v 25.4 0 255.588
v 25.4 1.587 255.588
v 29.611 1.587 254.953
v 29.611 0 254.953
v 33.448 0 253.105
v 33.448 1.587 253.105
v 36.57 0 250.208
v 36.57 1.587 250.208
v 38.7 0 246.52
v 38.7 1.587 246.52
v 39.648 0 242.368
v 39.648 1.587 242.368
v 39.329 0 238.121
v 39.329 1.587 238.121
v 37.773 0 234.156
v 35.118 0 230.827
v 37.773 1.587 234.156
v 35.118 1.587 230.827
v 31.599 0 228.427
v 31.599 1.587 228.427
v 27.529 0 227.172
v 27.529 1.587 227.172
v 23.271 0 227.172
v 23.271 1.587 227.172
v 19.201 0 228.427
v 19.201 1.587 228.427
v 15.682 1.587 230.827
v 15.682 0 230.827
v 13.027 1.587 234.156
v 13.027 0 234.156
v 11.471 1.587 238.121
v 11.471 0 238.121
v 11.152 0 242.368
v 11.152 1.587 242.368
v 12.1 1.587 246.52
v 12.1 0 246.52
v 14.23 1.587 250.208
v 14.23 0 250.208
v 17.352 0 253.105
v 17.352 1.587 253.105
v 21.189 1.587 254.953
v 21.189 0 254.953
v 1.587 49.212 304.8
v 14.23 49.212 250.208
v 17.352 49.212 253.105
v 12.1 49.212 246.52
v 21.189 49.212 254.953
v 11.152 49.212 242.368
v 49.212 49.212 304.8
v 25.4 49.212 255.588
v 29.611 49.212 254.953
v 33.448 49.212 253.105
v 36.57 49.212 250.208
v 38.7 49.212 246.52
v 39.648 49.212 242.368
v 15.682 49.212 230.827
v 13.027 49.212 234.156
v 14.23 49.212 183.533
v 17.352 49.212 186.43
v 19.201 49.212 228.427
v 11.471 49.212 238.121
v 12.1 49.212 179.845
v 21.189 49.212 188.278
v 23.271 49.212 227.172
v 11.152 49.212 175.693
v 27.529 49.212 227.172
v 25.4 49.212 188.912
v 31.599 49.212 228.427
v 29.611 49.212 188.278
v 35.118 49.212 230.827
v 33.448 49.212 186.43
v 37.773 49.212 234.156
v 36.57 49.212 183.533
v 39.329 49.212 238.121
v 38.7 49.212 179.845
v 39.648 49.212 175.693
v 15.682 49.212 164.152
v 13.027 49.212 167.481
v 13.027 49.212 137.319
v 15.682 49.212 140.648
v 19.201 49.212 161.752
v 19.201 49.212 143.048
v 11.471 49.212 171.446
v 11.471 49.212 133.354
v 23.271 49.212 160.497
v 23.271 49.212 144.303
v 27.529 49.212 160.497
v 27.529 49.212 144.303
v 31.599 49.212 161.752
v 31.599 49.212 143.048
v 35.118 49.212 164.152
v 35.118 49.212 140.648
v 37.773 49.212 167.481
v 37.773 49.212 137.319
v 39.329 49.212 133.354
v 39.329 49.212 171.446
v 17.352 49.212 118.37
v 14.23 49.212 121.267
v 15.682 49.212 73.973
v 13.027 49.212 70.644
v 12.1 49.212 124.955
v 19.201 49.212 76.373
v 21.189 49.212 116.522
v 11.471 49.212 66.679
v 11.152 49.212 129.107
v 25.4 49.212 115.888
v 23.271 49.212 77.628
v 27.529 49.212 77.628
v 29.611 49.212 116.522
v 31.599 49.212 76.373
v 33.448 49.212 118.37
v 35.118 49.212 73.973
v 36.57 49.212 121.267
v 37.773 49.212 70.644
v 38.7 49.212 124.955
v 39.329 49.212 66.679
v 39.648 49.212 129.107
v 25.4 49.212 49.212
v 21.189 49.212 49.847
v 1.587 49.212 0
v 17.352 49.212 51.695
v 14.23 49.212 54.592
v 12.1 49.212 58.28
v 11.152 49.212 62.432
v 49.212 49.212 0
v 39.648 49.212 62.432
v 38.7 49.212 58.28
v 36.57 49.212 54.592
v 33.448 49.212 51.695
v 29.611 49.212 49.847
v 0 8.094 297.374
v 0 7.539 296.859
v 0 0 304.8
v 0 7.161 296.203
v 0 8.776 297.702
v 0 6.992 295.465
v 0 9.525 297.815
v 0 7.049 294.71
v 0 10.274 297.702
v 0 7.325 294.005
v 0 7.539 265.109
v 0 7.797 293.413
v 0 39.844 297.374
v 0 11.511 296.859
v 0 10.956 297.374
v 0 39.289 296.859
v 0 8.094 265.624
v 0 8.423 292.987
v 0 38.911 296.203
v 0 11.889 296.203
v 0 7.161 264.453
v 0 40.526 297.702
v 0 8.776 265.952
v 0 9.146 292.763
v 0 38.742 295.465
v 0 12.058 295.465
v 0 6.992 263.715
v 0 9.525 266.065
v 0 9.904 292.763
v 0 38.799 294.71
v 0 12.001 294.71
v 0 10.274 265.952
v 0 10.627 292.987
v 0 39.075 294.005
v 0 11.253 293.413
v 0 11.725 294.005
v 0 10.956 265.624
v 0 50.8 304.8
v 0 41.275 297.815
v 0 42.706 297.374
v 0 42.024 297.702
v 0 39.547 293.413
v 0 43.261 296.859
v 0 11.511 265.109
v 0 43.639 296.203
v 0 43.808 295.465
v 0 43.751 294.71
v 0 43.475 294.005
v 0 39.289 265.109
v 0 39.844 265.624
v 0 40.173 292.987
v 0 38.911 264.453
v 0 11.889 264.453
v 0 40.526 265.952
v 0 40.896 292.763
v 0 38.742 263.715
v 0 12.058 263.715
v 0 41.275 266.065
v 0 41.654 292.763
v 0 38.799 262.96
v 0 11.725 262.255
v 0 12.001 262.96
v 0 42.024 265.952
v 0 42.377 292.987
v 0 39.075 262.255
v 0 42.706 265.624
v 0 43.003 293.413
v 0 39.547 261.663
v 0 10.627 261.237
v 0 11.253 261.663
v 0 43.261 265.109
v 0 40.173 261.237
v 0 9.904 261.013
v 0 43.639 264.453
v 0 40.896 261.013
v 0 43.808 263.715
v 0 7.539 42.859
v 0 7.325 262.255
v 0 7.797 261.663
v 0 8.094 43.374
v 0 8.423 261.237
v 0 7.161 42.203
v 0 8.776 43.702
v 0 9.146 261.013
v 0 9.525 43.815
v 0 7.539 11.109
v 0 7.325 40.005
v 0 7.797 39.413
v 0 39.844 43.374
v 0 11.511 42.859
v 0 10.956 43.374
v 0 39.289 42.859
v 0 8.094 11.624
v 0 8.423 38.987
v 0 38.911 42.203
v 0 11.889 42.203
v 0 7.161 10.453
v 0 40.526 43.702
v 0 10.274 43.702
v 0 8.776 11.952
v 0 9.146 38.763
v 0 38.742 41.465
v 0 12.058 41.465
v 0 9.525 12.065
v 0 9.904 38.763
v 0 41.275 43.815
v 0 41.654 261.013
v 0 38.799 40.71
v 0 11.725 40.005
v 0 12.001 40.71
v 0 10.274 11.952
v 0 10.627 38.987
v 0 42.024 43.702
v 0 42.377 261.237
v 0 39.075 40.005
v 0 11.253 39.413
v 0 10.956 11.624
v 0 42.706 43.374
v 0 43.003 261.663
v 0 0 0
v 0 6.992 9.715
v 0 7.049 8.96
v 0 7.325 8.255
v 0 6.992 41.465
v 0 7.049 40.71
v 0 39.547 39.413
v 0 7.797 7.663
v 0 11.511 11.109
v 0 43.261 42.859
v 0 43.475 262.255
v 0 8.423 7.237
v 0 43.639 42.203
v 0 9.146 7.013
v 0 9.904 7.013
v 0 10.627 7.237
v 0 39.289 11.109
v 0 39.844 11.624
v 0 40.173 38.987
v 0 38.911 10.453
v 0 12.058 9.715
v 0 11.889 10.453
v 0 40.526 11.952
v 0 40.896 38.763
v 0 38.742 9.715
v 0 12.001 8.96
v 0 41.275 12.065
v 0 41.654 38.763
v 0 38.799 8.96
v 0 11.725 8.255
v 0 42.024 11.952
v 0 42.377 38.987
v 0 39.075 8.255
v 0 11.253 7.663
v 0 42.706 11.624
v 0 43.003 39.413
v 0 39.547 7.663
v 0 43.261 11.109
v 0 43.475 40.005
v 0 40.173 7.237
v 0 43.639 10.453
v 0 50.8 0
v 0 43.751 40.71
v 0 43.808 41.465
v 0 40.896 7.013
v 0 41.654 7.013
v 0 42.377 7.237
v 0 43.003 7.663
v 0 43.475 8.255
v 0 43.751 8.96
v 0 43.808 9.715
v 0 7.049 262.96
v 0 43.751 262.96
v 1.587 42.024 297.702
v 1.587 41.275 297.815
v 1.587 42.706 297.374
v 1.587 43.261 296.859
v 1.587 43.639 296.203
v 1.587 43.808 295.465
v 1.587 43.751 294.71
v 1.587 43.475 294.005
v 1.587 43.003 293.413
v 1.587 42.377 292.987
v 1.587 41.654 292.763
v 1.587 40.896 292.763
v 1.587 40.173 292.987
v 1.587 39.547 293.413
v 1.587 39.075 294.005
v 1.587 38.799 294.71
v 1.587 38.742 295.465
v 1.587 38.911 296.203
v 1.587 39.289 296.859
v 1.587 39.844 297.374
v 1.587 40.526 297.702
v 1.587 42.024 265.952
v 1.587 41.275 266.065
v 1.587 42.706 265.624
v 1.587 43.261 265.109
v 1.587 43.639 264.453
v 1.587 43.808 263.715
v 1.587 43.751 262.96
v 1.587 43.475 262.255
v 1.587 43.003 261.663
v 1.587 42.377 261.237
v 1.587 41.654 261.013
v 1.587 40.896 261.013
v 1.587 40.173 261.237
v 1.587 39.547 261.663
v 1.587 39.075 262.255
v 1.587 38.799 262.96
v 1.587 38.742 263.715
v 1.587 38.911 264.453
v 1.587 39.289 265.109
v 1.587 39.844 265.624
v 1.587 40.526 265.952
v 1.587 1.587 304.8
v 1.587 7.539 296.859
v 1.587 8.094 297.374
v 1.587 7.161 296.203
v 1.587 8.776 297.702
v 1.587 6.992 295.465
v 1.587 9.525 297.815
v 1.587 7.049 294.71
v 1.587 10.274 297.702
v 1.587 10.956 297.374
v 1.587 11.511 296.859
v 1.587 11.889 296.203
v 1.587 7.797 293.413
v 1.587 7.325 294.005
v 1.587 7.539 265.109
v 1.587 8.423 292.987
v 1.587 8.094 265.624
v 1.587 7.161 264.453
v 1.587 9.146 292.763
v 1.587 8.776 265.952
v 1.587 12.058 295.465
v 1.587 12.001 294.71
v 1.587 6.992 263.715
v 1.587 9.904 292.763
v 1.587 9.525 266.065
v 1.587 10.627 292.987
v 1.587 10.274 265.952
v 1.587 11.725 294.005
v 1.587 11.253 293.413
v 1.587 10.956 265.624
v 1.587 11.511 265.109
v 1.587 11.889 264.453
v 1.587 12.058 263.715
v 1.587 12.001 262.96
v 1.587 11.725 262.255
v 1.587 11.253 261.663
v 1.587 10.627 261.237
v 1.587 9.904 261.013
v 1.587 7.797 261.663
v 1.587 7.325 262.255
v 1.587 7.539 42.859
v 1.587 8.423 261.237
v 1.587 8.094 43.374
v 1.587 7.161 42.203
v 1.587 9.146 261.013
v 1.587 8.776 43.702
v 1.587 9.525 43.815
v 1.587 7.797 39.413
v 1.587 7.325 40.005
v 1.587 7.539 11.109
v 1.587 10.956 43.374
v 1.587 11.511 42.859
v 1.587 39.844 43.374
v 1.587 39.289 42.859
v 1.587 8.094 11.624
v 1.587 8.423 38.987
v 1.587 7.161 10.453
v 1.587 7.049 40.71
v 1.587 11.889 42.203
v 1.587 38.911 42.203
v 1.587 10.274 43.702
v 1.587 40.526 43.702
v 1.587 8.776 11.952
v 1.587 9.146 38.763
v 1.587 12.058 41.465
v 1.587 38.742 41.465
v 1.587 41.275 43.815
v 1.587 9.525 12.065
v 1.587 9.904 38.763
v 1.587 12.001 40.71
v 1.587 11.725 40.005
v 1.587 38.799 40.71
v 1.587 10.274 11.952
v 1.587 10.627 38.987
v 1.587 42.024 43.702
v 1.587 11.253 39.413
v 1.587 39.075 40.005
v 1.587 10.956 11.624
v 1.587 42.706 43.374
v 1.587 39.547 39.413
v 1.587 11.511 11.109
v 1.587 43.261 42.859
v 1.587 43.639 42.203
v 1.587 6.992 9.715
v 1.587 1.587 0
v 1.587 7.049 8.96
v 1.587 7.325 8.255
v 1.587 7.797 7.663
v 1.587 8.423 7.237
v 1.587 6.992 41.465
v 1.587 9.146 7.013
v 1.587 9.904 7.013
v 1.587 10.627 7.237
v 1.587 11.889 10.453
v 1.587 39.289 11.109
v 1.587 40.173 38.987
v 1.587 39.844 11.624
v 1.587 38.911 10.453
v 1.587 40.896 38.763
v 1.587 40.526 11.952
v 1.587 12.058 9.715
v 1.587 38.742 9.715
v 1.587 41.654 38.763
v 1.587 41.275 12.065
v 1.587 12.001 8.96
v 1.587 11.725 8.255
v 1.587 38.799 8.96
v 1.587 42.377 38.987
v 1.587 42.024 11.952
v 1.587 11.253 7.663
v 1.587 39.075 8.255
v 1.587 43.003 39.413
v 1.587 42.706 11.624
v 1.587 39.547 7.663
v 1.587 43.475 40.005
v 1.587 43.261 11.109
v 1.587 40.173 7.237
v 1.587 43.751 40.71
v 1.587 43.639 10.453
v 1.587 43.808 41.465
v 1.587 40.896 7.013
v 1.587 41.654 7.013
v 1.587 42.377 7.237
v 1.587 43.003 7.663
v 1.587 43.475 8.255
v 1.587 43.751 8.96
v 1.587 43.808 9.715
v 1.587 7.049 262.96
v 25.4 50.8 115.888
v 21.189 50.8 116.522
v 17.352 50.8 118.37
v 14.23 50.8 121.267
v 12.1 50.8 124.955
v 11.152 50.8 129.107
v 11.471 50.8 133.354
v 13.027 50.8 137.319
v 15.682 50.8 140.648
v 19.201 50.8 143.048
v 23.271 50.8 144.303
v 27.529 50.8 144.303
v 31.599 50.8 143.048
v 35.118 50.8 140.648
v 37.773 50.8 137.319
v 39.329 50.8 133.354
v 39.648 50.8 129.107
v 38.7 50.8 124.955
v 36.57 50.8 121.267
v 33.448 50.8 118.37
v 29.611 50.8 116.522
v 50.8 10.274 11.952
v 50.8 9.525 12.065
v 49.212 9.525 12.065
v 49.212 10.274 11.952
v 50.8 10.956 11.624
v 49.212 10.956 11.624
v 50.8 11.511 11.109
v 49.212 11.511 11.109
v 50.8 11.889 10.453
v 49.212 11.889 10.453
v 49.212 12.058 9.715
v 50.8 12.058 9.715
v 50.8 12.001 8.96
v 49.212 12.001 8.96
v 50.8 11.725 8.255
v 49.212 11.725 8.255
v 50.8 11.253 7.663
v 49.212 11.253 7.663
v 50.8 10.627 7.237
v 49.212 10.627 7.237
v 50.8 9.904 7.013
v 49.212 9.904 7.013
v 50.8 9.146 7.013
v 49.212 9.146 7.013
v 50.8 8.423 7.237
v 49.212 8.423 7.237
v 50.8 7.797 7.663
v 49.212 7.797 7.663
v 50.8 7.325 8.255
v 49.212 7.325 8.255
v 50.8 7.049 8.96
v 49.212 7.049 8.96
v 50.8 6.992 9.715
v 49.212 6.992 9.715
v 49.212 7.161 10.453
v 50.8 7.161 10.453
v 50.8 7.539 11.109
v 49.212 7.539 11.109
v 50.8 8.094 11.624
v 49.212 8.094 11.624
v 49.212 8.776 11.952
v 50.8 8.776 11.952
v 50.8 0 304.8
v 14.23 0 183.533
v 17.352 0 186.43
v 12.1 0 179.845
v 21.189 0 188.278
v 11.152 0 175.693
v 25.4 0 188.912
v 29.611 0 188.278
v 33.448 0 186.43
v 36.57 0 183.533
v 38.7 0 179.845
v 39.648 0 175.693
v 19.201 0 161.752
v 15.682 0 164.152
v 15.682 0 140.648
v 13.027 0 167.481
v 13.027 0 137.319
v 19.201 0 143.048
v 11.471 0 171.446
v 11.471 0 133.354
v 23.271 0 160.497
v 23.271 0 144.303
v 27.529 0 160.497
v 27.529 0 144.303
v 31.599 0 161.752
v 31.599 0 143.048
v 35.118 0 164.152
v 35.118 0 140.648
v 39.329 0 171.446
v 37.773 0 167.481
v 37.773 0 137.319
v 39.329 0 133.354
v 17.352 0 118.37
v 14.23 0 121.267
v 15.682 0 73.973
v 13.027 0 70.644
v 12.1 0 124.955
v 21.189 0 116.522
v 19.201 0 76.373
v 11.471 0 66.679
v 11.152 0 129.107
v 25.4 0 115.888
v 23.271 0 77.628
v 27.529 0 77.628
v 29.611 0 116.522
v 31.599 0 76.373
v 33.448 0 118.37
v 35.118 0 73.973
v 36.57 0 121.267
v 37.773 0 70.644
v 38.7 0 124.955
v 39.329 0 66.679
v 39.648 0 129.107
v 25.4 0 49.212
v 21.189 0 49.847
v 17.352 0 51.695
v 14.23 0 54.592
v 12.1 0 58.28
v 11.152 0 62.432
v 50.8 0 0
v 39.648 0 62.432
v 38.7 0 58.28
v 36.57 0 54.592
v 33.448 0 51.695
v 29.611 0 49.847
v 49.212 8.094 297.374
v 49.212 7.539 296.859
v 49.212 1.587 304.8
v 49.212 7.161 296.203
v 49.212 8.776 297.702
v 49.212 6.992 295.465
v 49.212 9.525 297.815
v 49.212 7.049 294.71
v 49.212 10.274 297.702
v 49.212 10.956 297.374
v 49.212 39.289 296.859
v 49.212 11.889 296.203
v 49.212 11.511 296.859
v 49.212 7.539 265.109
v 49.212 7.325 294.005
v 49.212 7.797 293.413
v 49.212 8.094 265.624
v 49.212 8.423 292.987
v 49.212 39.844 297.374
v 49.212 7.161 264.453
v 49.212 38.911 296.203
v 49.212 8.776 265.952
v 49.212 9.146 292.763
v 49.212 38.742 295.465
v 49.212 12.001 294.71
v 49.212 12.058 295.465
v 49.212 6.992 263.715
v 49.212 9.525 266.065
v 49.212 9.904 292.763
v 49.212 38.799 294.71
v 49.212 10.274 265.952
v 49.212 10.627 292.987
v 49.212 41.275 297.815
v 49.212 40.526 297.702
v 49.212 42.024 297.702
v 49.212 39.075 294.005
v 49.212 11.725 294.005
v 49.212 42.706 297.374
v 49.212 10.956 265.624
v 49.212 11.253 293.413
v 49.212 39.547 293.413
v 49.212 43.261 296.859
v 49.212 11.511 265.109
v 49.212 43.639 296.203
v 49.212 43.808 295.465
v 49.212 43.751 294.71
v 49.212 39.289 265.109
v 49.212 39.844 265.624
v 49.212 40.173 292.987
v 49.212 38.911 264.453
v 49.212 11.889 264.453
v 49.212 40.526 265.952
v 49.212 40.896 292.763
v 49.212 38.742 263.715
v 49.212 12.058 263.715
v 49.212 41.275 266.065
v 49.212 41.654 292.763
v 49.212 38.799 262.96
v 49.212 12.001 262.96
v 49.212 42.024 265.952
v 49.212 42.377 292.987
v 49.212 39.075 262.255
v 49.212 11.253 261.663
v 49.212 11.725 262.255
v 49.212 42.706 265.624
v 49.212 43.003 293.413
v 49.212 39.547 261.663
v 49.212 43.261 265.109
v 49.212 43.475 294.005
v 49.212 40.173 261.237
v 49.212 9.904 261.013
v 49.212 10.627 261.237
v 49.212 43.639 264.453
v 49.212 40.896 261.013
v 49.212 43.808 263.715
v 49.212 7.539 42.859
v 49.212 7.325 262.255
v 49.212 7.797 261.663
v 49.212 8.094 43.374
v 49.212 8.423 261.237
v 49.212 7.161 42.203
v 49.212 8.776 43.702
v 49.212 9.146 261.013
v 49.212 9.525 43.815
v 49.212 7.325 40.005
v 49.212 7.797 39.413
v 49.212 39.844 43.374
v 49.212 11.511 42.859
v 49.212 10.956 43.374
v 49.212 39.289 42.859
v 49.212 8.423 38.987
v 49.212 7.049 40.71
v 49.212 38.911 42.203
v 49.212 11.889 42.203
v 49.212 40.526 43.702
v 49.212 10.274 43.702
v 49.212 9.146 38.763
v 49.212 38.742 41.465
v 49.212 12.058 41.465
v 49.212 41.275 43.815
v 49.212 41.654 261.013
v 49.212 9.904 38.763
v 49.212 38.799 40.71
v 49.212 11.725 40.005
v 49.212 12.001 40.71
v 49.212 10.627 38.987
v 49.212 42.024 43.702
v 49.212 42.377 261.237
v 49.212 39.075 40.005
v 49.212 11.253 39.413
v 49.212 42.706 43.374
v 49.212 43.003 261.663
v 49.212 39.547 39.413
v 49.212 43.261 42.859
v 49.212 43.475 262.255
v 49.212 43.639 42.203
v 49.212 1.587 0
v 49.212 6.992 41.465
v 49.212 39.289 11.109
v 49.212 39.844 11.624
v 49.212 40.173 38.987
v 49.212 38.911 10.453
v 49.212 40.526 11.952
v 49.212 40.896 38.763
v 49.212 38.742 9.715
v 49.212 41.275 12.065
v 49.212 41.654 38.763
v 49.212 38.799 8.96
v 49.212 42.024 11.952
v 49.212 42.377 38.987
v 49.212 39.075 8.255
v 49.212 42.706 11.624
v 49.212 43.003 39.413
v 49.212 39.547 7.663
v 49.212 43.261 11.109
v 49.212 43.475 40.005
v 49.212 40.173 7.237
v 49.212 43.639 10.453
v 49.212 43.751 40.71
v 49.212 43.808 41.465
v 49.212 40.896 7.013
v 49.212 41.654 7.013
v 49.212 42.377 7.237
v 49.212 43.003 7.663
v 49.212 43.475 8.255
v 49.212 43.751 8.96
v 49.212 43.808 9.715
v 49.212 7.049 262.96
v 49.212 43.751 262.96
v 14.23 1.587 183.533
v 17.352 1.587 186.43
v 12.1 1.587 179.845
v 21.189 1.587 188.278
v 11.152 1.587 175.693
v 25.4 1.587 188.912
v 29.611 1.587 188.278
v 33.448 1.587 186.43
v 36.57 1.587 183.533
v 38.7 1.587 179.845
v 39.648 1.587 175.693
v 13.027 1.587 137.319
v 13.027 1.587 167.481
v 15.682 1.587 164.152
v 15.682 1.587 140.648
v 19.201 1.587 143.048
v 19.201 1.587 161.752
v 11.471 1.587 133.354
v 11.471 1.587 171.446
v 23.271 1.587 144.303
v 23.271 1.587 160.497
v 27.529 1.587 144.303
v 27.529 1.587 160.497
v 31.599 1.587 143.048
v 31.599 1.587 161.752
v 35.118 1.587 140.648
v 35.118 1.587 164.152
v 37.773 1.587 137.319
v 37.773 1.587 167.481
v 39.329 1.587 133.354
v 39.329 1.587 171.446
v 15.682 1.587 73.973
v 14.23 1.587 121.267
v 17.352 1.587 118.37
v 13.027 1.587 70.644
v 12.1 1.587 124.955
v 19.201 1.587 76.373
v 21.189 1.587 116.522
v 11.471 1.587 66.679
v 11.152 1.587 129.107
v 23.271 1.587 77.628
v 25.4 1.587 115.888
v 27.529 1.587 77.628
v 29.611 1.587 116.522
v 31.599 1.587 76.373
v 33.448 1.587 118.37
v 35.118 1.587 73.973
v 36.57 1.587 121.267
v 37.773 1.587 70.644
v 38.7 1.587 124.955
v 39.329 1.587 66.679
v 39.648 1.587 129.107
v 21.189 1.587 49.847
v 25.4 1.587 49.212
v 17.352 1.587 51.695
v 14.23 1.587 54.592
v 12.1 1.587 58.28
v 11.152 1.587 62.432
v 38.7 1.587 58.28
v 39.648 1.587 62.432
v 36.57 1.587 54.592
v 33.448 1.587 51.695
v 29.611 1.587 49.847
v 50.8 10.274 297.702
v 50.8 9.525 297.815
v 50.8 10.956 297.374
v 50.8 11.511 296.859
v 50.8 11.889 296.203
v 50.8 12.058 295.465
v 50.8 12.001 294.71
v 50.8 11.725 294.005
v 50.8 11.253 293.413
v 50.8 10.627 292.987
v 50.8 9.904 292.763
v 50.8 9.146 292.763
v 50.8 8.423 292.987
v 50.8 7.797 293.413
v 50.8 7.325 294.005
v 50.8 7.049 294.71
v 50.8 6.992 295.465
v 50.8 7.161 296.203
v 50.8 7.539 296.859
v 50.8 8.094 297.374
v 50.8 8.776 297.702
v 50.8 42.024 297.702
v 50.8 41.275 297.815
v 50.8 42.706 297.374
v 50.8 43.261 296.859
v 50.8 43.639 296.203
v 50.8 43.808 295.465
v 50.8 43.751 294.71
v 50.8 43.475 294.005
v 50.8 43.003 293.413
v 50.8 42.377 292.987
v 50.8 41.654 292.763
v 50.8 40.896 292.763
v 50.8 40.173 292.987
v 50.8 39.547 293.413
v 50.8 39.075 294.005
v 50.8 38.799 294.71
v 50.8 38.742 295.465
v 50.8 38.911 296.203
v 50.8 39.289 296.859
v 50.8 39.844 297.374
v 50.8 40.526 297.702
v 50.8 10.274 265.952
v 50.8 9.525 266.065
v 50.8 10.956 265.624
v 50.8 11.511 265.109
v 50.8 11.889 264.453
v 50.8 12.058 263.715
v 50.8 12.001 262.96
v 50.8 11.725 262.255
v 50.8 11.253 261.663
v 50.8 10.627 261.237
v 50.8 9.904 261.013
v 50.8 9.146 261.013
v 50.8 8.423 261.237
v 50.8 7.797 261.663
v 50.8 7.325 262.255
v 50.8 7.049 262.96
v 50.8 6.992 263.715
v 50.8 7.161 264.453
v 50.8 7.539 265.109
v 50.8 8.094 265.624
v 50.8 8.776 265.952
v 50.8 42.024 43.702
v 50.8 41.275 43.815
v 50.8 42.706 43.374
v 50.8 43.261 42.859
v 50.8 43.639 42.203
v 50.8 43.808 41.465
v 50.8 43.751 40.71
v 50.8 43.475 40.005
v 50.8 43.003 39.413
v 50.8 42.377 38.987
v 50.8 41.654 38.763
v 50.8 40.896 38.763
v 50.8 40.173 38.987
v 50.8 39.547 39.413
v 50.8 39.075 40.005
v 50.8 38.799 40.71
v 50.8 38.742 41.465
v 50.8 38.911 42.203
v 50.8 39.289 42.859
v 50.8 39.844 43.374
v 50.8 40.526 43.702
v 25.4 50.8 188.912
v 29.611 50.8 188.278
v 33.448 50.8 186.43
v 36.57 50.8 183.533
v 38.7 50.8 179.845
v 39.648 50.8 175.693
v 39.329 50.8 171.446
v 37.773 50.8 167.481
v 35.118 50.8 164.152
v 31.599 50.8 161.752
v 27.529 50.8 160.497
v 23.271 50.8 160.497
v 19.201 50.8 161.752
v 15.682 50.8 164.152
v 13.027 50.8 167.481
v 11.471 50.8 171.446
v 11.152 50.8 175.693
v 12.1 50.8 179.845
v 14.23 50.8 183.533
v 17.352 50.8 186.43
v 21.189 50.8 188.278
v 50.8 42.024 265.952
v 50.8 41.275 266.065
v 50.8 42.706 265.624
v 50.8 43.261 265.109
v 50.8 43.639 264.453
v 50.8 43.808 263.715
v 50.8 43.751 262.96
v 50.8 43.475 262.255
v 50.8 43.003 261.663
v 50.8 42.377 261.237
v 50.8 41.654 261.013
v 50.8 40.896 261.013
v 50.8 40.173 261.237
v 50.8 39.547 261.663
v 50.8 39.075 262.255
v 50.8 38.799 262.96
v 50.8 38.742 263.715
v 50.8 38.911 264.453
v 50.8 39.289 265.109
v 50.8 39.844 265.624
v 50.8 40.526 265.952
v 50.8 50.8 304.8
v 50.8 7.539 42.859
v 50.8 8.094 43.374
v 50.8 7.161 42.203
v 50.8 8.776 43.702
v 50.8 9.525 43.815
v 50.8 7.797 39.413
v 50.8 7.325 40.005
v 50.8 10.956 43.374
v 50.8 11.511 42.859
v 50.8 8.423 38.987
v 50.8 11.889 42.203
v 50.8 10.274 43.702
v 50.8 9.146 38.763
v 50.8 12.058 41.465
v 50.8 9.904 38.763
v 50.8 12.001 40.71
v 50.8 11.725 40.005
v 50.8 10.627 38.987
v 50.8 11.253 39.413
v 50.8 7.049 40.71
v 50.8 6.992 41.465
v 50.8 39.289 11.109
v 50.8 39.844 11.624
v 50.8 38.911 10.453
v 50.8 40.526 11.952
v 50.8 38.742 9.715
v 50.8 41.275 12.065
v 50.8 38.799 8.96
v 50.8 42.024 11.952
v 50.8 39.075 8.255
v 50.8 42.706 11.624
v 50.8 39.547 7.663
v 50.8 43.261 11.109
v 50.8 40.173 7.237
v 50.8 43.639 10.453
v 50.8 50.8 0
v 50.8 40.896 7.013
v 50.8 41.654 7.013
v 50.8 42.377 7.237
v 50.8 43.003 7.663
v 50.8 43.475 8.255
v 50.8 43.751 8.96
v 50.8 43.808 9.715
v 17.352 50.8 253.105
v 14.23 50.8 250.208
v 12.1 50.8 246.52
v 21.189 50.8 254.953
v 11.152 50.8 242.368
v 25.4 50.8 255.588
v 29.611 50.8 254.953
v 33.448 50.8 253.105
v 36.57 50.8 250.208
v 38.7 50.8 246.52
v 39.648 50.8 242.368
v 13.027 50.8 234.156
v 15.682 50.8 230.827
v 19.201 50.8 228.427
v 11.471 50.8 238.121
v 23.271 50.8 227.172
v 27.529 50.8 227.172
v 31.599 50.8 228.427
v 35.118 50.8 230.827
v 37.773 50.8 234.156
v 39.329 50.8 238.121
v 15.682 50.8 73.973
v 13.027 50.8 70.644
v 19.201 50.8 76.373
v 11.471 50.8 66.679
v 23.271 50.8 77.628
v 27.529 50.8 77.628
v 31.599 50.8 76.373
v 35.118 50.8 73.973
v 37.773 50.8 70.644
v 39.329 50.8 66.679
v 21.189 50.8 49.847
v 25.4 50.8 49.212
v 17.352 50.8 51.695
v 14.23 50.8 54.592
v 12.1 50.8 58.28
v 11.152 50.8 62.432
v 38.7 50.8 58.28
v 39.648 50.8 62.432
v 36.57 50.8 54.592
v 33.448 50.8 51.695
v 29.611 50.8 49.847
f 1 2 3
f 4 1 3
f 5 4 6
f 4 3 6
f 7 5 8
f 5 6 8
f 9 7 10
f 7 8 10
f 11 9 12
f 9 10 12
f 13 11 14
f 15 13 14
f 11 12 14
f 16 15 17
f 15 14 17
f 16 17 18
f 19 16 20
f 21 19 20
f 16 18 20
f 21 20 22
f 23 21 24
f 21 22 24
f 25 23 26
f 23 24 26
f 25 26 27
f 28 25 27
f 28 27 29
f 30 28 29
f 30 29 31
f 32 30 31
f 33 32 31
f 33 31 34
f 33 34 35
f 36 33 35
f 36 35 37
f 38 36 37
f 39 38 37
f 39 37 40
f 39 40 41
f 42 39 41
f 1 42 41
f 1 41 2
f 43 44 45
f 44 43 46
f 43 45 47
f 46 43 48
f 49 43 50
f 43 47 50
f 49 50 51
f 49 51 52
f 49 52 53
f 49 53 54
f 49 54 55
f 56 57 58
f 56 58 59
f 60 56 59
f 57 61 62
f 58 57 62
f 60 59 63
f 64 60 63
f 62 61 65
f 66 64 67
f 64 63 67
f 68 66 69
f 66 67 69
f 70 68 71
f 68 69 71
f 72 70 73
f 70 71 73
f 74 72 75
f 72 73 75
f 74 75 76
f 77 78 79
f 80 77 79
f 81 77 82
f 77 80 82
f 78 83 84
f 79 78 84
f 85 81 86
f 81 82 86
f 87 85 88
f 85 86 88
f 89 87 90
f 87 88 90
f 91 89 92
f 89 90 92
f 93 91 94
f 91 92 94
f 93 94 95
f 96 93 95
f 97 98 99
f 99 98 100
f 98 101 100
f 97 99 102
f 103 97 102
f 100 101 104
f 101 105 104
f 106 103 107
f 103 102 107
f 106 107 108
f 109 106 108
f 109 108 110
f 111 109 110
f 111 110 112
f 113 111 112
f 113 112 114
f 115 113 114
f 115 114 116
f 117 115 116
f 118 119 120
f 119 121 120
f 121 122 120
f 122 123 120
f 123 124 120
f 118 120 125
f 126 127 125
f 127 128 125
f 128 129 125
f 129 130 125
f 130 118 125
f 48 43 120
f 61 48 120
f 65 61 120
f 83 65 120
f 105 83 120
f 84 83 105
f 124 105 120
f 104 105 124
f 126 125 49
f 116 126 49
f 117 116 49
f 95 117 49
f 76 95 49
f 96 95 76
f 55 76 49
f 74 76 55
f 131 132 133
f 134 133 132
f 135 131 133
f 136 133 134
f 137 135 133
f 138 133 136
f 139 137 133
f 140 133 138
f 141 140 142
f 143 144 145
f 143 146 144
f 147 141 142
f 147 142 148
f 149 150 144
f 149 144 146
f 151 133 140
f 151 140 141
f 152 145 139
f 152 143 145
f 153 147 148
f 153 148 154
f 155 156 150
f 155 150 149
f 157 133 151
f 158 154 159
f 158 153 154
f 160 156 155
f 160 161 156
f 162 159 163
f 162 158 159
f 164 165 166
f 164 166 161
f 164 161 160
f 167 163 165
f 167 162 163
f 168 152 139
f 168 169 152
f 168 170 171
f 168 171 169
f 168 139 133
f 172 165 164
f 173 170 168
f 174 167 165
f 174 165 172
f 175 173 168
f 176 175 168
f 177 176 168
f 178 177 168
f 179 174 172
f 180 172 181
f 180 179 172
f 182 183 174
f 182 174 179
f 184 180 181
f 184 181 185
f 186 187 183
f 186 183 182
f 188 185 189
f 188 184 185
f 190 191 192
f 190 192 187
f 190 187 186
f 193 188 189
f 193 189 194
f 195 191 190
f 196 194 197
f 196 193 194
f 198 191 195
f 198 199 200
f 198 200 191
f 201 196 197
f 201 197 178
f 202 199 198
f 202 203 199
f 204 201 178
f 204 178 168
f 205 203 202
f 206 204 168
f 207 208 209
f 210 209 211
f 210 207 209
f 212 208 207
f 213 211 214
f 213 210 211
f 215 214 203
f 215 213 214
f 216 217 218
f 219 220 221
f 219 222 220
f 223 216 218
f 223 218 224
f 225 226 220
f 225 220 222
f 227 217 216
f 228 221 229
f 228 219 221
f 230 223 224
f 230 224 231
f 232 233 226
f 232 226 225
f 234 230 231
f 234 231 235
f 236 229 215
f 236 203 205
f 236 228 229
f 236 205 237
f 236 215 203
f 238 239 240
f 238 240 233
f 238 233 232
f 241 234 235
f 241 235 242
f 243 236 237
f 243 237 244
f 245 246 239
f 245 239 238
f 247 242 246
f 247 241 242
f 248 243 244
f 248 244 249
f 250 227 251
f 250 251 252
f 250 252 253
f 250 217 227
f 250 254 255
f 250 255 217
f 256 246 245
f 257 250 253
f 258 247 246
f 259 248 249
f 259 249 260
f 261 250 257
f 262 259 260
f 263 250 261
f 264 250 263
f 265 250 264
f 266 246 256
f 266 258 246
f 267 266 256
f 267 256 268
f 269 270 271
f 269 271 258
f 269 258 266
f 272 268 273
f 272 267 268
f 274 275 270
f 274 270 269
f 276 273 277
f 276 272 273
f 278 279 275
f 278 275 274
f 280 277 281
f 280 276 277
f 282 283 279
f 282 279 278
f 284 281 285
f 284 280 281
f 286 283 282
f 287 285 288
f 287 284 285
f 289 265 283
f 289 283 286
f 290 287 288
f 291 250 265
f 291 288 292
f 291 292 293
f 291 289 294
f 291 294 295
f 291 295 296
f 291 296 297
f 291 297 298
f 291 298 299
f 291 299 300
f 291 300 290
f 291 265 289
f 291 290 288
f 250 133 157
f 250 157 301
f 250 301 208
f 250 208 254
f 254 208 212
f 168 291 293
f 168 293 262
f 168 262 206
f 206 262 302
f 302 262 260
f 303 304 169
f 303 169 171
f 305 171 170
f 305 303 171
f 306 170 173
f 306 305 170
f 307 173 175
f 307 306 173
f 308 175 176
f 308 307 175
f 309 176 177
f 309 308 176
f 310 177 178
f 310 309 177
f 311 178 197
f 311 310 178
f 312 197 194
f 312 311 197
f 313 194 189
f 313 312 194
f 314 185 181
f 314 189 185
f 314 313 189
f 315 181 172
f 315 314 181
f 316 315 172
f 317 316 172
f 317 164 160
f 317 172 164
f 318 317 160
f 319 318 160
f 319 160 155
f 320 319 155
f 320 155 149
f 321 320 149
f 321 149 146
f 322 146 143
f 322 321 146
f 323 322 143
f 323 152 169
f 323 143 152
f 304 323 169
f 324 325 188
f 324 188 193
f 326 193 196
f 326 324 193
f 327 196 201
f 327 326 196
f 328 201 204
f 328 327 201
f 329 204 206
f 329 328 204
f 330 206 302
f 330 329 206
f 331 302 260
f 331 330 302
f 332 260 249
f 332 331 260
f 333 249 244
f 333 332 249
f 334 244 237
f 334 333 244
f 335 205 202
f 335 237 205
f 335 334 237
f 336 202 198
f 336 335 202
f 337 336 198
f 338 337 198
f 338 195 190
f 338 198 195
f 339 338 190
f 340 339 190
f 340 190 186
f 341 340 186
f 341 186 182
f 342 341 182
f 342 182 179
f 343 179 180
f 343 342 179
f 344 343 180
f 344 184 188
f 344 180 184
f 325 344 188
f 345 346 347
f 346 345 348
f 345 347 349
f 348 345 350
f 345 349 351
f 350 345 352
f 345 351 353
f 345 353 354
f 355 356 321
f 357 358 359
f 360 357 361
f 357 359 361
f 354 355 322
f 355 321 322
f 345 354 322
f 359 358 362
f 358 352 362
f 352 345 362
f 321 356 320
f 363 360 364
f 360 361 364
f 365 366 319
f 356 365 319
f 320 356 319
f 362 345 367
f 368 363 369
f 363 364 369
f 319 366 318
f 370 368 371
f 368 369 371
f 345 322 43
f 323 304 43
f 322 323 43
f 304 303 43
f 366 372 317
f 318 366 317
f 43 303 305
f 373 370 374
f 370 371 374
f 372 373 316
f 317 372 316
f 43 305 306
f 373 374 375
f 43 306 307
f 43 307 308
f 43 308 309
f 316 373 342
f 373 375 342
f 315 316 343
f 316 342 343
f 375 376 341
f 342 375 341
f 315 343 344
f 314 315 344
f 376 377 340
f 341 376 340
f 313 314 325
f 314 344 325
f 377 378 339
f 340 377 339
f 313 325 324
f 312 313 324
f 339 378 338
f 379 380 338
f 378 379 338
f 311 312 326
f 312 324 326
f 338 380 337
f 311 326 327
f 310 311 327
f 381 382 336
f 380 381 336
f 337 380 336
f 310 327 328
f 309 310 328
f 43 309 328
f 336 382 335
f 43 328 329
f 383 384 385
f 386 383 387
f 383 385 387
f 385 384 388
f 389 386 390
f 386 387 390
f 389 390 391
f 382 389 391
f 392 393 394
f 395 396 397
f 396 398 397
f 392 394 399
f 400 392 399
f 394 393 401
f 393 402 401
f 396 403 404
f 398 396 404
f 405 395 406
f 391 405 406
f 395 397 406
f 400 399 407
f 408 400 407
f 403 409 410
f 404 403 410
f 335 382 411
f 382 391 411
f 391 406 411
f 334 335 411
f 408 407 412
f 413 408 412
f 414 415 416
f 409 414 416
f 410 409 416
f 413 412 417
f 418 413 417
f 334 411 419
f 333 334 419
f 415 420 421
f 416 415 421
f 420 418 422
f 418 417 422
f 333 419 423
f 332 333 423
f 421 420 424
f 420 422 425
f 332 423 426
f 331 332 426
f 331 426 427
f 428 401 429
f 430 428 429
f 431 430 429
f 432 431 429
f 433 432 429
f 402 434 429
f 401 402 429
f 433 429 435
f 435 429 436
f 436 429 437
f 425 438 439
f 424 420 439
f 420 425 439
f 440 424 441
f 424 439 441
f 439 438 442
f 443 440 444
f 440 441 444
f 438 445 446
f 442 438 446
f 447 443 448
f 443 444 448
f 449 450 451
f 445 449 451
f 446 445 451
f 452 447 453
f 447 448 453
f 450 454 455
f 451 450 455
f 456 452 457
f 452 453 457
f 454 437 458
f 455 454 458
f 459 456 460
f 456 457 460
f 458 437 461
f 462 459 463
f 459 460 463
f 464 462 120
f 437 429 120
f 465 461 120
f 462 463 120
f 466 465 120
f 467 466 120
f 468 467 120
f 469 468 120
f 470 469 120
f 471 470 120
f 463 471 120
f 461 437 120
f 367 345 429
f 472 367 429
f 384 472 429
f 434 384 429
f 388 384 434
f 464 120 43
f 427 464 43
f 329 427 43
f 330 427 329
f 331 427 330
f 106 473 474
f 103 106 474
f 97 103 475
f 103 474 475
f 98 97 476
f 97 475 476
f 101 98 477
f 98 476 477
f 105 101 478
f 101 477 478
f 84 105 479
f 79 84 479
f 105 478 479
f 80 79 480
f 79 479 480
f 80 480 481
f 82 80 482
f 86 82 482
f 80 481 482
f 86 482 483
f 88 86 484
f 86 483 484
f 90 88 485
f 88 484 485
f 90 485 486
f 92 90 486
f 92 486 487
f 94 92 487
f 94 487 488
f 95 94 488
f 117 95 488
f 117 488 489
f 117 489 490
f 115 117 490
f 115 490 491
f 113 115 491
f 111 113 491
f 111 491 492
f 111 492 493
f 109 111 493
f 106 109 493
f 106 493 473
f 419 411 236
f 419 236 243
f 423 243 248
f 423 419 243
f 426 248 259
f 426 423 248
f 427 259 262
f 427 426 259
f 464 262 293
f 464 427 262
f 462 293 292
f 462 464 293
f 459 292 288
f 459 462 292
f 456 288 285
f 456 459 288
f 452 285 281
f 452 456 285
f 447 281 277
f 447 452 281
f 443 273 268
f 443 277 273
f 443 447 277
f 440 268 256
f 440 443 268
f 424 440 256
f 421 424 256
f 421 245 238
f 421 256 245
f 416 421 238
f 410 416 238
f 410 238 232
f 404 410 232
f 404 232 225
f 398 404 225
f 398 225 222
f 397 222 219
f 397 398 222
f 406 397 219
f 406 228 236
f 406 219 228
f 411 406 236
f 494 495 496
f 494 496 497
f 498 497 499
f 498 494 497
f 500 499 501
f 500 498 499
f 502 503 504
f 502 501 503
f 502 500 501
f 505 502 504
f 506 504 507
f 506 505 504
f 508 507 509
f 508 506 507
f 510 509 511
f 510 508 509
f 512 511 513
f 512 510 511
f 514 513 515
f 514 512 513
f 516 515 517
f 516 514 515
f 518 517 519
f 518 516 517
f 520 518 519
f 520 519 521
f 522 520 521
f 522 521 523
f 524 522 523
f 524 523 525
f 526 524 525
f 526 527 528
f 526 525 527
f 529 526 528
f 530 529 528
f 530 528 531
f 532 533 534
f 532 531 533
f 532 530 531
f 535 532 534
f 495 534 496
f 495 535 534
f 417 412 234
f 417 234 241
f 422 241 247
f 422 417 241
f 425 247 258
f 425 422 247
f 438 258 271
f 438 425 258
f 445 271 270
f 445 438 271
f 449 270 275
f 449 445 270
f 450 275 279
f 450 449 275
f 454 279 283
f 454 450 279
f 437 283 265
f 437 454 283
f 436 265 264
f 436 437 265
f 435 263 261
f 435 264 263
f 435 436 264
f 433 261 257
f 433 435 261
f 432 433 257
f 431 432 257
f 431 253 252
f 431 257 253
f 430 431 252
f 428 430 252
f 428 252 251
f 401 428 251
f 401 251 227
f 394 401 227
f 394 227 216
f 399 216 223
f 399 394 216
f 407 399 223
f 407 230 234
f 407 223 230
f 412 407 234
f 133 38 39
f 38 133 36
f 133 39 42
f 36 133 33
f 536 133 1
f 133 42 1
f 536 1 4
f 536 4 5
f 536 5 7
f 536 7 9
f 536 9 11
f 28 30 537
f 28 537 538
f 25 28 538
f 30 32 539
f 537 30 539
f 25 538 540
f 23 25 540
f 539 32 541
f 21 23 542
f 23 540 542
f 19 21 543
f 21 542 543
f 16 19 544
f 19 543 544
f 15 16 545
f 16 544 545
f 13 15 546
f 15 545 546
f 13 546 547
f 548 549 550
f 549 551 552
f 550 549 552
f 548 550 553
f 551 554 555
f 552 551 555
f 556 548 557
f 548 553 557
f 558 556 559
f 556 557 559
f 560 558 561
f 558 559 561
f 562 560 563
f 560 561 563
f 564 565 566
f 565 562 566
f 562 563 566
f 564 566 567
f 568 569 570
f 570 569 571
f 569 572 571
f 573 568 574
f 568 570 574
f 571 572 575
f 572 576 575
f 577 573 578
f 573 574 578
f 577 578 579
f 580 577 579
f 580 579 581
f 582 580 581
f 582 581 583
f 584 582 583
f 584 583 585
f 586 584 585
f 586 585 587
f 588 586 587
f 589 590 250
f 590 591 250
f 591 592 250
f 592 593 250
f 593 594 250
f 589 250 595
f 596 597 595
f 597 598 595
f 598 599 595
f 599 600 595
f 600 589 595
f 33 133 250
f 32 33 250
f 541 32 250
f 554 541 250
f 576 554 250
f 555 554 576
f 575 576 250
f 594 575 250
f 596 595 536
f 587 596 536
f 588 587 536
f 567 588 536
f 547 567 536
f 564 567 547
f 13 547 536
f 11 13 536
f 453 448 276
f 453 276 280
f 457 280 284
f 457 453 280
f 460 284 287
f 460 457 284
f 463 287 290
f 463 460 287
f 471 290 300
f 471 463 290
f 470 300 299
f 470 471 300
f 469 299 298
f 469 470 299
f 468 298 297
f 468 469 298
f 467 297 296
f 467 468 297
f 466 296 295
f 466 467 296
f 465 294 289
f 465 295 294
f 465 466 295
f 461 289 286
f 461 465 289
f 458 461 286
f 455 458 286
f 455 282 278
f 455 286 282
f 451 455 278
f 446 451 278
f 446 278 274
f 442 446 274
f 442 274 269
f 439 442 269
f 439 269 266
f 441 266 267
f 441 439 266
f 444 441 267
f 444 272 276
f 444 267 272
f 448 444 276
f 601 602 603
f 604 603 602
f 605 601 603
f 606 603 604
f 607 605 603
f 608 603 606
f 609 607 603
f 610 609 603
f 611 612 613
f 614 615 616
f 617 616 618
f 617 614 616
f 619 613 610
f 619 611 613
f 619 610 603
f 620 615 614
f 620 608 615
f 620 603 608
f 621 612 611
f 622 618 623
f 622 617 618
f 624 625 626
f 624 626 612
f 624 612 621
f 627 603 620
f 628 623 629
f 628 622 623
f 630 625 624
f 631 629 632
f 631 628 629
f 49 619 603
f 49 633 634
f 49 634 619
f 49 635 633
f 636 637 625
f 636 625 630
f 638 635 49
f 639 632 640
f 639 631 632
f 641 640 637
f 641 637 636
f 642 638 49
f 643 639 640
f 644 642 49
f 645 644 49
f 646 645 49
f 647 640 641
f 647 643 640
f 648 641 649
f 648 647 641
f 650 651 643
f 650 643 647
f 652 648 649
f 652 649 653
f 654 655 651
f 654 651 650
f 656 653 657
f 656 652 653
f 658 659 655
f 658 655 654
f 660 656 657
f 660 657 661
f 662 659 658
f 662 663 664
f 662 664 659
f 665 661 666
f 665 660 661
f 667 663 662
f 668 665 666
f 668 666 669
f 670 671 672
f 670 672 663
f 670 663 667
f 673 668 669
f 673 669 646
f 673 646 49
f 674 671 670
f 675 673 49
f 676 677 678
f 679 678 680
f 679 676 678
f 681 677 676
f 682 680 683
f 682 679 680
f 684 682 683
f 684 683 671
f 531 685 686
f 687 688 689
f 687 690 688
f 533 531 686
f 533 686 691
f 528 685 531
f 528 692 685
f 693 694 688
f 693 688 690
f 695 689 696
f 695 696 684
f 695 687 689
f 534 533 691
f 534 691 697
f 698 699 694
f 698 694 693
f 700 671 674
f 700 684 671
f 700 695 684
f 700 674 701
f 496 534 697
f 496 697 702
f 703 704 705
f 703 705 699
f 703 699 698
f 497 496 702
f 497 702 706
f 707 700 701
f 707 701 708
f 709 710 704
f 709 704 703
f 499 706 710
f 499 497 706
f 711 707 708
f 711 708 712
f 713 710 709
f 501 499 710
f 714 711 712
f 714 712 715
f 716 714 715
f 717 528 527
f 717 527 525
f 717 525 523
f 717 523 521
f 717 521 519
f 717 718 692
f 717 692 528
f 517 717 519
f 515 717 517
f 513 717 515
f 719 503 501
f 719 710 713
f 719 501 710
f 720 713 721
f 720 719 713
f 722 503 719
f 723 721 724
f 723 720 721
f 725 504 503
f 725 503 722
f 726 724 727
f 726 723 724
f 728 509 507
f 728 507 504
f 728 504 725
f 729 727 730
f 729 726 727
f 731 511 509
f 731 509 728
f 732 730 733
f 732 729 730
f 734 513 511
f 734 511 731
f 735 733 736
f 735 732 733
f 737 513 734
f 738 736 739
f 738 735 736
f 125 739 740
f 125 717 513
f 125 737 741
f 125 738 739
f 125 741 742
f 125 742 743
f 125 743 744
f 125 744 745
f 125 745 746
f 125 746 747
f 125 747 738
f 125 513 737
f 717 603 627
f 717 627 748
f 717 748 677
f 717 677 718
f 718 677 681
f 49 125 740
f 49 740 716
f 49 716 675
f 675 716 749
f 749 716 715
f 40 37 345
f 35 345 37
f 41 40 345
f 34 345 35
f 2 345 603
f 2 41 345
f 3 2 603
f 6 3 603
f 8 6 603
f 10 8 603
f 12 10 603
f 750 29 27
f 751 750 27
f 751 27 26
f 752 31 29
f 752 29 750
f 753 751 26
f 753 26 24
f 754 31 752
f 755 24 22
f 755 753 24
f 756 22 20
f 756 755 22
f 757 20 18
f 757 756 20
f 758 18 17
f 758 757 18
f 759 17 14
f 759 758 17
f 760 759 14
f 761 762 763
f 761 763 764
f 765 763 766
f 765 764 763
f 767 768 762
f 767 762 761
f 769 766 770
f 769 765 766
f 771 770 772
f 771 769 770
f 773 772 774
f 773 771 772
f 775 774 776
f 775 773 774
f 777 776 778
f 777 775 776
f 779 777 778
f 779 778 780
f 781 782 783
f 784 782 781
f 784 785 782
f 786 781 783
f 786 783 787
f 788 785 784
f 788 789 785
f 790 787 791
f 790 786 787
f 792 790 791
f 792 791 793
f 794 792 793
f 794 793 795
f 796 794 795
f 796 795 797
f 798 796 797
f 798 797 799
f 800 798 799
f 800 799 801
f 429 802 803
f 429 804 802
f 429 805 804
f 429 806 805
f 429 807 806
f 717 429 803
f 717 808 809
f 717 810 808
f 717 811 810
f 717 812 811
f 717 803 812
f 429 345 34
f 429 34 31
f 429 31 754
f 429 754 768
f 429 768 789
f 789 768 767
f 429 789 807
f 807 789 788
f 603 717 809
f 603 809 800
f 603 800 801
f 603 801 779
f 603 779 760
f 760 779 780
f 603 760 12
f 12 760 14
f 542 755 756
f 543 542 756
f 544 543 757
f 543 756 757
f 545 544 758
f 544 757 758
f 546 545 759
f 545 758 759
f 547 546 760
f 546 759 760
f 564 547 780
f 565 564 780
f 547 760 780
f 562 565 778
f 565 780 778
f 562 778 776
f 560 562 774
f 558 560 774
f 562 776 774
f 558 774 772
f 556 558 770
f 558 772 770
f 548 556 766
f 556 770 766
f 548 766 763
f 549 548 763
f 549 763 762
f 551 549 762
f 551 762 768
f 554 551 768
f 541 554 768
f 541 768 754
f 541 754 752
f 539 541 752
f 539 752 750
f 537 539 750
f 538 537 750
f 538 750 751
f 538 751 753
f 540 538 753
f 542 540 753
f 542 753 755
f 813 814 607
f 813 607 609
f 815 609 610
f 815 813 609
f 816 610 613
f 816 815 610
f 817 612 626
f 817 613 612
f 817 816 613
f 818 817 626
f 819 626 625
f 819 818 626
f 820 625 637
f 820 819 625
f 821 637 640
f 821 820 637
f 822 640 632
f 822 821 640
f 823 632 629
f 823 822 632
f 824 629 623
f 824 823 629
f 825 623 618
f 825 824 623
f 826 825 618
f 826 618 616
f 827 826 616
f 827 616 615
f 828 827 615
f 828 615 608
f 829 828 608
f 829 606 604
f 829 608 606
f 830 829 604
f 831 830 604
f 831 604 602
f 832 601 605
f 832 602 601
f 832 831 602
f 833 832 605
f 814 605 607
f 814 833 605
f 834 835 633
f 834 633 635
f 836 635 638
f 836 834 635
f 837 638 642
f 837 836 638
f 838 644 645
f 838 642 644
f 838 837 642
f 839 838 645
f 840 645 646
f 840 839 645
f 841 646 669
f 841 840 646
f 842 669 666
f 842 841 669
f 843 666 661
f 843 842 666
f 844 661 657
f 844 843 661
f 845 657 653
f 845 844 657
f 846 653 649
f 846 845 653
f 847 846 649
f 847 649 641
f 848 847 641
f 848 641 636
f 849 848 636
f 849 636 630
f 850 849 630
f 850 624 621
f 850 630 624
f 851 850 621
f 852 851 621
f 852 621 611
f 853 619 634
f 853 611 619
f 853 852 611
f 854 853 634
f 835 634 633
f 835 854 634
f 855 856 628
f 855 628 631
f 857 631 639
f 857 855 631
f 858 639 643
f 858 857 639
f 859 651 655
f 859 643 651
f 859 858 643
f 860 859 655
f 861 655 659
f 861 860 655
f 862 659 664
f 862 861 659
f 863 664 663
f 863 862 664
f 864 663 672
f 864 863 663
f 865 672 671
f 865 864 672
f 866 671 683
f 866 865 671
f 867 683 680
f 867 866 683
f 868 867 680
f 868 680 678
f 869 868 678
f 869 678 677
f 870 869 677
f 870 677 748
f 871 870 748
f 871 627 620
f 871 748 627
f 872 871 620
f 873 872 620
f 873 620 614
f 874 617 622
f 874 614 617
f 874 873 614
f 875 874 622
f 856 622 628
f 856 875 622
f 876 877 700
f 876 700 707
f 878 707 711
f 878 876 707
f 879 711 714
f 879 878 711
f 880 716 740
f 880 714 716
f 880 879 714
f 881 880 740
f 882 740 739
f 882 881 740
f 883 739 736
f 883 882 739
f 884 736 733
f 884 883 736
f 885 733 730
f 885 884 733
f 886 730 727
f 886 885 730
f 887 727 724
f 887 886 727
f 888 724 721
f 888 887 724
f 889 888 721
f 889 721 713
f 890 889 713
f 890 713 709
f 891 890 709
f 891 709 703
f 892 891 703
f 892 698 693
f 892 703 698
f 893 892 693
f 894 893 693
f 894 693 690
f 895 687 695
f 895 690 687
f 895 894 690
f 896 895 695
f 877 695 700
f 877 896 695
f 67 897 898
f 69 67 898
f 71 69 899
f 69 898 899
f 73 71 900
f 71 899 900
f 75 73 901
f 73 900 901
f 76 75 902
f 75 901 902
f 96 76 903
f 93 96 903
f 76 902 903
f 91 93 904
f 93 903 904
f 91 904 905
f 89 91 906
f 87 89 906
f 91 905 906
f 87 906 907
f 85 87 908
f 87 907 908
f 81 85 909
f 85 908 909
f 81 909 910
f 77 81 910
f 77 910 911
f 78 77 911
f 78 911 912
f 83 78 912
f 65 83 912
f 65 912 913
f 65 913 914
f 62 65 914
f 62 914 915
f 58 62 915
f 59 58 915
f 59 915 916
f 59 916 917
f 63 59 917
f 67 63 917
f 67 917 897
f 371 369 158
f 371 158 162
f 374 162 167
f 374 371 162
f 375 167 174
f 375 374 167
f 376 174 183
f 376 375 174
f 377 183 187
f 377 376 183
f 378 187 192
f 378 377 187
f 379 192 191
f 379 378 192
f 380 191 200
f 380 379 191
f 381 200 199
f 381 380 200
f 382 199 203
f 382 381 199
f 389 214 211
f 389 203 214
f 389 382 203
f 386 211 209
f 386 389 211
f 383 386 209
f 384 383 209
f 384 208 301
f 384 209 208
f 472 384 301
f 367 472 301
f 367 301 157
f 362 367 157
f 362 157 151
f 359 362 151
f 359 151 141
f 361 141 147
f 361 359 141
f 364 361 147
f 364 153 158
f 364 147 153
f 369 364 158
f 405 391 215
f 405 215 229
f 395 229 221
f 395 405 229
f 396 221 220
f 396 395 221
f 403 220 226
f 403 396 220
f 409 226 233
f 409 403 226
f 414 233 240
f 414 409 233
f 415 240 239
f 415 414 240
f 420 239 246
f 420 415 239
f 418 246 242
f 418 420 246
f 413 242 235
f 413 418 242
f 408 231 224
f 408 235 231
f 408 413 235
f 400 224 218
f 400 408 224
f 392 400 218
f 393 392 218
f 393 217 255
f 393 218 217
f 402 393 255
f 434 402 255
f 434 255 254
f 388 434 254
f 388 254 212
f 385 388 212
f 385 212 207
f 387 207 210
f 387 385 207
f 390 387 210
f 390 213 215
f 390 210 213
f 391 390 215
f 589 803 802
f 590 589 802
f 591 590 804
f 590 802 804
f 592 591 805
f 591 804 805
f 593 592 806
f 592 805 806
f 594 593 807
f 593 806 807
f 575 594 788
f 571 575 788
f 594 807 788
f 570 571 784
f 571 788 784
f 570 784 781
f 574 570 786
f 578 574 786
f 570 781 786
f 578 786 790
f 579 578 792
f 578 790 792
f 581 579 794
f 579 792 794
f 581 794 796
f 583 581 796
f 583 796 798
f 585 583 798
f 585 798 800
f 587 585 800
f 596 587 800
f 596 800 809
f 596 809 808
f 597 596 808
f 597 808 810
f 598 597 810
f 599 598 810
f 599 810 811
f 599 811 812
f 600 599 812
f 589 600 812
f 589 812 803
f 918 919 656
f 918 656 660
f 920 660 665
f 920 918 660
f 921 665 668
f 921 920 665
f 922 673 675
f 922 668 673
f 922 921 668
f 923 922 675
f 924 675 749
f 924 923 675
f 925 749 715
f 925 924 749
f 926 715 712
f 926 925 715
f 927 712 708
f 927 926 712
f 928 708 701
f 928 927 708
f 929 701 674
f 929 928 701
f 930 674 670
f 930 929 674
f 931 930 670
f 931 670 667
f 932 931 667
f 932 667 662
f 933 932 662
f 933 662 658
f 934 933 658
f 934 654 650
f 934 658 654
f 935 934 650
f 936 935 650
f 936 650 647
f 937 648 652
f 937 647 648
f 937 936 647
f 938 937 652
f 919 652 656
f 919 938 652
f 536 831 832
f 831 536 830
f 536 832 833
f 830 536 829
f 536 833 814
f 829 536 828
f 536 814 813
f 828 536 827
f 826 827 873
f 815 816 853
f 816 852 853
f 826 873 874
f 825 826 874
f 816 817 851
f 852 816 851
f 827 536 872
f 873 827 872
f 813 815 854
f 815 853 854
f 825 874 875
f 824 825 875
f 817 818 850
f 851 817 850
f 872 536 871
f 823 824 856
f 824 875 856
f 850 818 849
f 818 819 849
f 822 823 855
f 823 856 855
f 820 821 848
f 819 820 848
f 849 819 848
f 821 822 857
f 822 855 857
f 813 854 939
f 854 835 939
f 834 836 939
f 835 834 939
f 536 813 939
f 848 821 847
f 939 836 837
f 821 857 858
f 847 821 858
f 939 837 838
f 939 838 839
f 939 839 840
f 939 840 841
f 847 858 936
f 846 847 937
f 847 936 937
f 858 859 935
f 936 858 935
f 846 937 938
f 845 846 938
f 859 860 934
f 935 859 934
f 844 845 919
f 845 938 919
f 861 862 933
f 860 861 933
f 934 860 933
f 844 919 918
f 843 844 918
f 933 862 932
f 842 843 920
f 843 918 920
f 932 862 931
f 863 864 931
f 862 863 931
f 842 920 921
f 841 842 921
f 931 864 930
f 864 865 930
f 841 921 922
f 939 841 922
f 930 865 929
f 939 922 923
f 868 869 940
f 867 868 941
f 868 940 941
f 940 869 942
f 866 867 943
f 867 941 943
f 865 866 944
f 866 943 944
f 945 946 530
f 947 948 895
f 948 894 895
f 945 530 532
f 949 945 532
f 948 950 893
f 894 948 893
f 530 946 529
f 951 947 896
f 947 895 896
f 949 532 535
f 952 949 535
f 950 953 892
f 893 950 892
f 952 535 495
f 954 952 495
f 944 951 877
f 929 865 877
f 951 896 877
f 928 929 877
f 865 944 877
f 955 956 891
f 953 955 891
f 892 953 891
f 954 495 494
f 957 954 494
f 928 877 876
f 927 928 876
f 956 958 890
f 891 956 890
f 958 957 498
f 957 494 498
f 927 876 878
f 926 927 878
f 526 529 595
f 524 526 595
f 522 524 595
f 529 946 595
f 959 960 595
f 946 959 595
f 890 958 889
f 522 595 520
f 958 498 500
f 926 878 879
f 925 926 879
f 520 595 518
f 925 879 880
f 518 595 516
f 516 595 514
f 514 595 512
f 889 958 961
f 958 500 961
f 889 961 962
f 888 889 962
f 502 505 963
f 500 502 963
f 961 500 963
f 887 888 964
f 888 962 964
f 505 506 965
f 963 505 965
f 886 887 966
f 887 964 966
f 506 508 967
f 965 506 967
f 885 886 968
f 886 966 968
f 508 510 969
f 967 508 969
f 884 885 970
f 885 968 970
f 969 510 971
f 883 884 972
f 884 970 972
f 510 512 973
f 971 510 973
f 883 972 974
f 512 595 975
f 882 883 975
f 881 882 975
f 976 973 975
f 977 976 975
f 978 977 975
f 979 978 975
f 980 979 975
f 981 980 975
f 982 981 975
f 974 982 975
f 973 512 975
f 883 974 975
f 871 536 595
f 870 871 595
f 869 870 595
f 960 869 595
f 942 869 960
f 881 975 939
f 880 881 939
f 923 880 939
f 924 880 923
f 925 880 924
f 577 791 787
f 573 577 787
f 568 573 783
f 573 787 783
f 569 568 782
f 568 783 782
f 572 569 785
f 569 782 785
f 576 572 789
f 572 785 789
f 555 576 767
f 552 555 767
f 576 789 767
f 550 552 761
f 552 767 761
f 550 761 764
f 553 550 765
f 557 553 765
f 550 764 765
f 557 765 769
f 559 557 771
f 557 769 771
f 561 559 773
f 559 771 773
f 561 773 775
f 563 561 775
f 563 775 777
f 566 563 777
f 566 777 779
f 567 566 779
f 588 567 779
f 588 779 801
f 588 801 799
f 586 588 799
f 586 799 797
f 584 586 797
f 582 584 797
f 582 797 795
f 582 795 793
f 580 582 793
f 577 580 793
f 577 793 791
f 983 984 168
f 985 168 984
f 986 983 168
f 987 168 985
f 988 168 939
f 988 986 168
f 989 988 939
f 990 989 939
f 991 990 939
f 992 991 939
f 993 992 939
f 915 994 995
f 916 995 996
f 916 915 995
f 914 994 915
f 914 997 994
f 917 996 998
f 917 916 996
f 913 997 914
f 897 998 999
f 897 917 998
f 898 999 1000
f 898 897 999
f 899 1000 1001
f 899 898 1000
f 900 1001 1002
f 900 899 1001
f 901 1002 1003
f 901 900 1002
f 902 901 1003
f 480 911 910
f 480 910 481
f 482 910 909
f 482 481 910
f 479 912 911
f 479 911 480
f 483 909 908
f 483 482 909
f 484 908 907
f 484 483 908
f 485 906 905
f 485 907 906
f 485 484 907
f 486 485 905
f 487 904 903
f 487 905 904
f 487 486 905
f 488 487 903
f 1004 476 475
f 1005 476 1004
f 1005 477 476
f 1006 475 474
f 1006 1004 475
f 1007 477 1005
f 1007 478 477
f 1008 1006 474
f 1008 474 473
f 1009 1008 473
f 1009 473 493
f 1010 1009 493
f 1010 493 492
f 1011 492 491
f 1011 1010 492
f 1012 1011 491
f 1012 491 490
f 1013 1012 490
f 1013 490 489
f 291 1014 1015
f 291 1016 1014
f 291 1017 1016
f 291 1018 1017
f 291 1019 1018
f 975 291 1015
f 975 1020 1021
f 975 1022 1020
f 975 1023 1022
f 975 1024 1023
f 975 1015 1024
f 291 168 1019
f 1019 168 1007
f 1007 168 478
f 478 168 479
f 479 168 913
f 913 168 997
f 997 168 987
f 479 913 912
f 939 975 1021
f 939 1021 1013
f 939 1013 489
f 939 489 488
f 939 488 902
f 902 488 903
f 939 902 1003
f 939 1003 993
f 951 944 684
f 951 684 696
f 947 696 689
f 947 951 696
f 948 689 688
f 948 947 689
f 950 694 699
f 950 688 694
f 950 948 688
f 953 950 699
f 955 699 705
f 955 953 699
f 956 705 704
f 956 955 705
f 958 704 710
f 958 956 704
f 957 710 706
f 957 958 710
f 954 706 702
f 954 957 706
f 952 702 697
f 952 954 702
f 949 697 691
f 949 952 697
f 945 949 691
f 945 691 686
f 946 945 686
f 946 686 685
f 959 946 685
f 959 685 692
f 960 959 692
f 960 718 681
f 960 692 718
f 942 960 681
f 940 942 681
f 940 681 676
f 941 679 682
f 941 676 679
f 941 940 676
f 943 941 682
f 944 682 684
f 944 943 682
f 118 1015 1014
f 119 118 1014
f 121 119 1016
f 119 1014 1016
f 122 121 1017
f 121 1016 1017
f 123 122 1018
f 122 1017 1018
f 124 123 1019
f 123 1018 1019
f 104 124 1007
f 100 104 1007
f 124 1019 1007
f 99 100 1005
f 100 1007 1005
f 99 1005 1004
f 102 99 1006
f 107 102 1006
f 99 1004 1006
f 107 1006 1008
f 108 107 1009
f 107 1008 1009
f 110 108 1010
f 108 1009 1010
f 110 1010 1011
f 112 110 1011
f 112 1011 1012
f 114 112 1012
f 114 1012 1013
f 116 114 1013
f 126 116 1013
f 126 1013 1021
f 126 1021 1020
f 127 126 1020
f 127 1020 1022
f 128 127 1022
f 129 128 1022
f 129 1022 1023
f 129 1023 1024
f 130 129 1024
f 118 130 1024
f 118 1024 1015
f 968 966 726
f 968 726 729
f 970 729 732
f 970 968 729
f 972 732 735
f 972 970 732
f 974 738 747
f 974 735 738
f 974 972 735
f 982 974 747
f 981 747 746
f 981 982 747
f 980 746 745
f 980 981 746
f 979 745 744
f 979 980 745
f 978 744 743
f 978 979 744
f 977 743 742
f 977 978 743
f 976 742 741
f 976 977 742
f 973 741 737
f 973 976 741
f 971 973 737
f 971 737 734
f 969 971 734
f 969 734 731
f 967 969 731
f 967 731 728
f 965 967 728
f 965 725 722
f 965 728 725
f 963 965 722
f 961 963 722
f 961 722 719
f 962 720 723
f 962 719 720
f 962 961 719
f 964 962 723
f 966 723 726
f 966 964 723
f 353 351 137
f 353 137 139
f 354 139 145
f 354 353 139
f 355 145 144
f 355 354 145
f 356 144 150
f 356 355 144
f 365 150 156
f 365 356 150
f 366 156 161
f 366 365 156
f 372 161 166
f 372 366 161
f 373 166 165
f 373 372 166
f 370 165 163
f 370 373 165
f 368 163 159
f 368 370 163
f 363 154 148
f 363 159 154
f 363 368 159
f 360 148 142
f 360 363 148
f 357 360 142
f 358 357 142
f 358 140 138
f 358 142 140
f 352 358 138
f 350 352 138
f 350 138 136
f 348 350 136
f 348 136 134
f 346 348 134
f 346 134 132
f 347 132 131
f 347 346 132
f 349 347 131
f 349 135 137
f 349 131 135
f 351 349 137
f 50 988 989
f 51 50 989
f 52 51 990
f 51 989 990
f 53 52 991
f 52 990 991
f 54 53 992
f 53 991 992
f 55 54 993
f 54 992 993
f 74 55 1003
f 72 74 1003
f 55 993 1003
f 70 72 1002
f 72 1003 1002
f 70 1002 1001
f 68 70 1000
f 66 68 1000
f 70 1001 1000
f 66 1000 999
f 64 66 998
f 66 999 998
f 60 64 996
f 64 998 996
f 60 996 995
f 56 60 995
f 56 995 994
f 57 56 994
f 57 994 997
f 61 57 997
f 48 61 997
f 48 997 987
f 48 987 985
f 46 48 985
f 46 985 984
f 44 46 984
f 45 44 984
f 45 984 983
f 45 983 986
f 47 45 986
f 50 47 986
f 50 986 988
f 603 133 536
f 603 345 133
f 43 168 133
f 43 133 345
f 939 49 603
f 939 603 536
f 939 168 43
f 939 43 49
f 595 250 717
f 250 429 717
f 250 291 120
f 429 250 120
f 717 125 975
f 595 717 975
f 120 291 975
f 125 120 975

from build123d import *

# Parameters (mm, degrees)
SKETCH2_W               = 50.8
SKETCH2_H               = 50.8
SKETCH2_W_2             = 47.625
SKETCH2_H_2             = 47.625
BOSS_EXTRUDE1_DEPTH     = 304.8
SKETCH3_R               = 14.2875
CUT_EXTRUDE1_DEPTH      = 314.152231351
CUT_EXTRUDE2_DEPTH      = 314.152231351
CUT_EXTRUDE2_DEPTH_BACK = 314.152231351
SKETCH4_R               = 2.54


with BuildPart() as part:
    # Sketch2 → Boss-Extrude1 (new body)
    with BuildSketch(Plane.XY):
        with Locations((25.4, 25.4)):
            Rectangle(SKETCH2_W, SKETCH2_H)
        with Locations((25.4, 25.4)):
            Rectangle(SKETCH2_W_2, SKETCH2_H_2, mode=Mode.SUBTRACT)
    extrude(amount=BOSS_EXTRUDE1_DEPTH)

    # Sketch3 → Cut-Extrude1 (cut, through all)
    with BuildSketch(Plane(origin=(0, 50.8, 0), x_dir=(1, 0, 0), z_dir=(0, 1, 0))):
        with Locations(Location((25.4, -241.3, 0), (0, 0, 270))):
            Circle(SKETCH3_R)
        with Locations(Location((25.4, -174.625, 0), (0, 0, 270))):
            Circle(SKETCH3_R)
        with Locations(Location((25.4, -130.175, 0), (0, 0, 90))):
            Circle(SKETCH3_R)
        with Locations(Location((25.4, -63.5, 0), (0, 0, 90))):
            Circle(SKETCH3_R)
    extrude(amount=-CUT_EXTRUDE1_DEPTH, mode=Mode.SUBTRACT)

    # Sketch4 → Cut-Extrude2 (cut, two sides: drawn at the far end of the back side and taken through both)
    with BuildSketch(Plane.ZY.offset(-CUT_EXTRUDE2_DEPTH_BACK)):
        with Locations((9.525, 41.275)):
            Circle(SKETCH4_R)
        with Locations((9.525, 9.525)):
            Circle(SKETCH4_R)
        with Locations((41.275, 41.275)):
            Circle(SKETCH4_R)
        with Locations((41.275, 9.525)):
            Circle(SKETCH4_R)
        with Locations((263.525, 9.525)):
            Circle(SKETCH4_R)
        with Locations((263.525, 41.275)):
            Circle(SKETCH4_R)
        with Locations((295.275, 9.525)):
            Circle(SKETCH4_R)
        with Locations((295.275, 41.275)):
            Circle(SKETCH4_R)
    extrude(amount=CUT_EXTRUDE2_DEPTH + CUT_EXTRUDE2_DEPTH_BACK, mode=Mode.SUBTRACT)


solid = part.part
